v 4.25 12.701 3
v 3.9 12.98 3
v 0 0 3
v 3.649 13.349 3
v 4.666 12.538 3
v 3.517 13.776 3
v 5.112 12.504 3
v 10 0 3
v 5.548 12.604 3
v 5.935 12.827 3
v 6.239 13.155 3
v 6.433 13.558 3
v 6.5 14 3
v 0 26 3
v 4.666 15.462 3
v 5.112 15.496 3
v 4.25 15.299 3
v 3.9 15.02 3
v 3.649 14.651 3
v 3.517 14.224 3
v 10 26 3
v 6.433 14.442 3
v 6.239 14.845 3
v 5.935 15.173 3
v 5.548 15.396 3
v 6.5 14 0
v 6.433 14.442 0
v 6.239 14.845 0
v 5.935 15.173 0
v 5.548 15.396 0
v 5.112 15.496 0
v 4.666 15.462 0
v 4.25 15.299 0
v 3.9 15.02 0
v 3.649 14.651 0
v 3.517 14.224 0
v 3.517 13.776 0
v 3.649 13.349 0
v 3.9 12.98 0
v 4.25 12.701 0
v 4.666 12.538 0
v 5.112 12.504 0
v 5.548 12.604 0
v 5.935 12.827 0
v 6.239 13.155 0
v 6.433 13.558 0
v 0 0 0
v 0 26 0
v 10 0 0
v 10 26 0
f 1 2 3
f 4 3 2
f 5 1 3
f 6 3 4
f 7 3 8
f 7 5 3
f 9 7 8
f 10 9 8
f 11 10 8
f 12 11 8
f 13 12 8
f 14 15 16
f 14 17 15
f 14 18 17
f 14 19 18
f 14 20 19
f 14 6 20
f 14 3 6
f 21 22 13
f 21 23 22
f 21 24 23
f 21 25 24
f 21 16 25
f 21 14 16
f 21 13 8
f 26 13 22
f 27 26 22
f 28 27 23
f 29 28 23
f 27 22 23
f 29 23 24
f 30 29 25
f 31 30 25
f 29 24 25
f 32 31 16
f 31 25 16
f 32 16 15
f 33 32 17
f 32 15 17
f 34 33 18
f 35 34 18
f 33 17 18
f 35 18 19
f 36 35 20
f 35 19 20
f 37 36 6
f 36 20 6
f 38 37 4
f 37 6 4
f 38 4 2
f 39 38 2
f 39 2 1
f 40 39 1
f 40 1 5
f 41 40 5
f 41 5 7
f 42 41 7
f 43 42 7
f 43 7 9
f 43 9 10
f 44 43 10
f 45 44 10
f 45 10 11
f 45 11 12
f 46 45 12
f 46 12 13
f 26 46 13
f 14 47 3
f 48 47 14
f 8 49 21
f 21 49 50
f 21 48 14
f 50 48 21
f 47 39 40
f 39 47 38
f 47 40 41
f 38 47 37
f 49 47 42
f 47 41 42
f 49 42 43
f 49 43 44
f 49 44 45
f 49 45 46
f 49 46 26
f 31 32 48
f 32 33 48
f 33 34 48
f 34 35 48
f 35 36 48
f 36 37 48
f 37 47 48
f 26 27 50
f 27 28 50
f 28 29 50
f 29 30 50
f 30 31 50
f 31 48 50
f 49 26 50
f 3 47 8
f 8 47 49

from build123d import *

# Parameters (mm, degrees)
SKETCH_1_W          = 10
SKETCH_1_H          = 26
EXTRUDE_1_DEPTH     = 3
SKETCH_2_R          = 1.5
CUT_EXTRUDE_1_DEPTH = 29.017851452


with BuildPart() as part:
    # Эскиз1 → Бобышка-Вытянуть1 (new body)
    with BuildSketch(Plane.XY):
        with Locations((5, 13)):
            Rectangle(SKETCH_1_W, SKETCH_1_H)
    extrude(amount=EXTRUDE_1_DEPTH)

    # Эскиз2 → Вырез-Вытянуть1 (cut, through all)
    with BuildSketch(Plane.XY.offset(3)):
        with Locations((5, 14)):
            Circle(SKETCH_2_R)
    extrude(amount=-CUT_EXTRUDE_1_DEPTH, mode=Mode.SUBTRACT)


solid = part.part
